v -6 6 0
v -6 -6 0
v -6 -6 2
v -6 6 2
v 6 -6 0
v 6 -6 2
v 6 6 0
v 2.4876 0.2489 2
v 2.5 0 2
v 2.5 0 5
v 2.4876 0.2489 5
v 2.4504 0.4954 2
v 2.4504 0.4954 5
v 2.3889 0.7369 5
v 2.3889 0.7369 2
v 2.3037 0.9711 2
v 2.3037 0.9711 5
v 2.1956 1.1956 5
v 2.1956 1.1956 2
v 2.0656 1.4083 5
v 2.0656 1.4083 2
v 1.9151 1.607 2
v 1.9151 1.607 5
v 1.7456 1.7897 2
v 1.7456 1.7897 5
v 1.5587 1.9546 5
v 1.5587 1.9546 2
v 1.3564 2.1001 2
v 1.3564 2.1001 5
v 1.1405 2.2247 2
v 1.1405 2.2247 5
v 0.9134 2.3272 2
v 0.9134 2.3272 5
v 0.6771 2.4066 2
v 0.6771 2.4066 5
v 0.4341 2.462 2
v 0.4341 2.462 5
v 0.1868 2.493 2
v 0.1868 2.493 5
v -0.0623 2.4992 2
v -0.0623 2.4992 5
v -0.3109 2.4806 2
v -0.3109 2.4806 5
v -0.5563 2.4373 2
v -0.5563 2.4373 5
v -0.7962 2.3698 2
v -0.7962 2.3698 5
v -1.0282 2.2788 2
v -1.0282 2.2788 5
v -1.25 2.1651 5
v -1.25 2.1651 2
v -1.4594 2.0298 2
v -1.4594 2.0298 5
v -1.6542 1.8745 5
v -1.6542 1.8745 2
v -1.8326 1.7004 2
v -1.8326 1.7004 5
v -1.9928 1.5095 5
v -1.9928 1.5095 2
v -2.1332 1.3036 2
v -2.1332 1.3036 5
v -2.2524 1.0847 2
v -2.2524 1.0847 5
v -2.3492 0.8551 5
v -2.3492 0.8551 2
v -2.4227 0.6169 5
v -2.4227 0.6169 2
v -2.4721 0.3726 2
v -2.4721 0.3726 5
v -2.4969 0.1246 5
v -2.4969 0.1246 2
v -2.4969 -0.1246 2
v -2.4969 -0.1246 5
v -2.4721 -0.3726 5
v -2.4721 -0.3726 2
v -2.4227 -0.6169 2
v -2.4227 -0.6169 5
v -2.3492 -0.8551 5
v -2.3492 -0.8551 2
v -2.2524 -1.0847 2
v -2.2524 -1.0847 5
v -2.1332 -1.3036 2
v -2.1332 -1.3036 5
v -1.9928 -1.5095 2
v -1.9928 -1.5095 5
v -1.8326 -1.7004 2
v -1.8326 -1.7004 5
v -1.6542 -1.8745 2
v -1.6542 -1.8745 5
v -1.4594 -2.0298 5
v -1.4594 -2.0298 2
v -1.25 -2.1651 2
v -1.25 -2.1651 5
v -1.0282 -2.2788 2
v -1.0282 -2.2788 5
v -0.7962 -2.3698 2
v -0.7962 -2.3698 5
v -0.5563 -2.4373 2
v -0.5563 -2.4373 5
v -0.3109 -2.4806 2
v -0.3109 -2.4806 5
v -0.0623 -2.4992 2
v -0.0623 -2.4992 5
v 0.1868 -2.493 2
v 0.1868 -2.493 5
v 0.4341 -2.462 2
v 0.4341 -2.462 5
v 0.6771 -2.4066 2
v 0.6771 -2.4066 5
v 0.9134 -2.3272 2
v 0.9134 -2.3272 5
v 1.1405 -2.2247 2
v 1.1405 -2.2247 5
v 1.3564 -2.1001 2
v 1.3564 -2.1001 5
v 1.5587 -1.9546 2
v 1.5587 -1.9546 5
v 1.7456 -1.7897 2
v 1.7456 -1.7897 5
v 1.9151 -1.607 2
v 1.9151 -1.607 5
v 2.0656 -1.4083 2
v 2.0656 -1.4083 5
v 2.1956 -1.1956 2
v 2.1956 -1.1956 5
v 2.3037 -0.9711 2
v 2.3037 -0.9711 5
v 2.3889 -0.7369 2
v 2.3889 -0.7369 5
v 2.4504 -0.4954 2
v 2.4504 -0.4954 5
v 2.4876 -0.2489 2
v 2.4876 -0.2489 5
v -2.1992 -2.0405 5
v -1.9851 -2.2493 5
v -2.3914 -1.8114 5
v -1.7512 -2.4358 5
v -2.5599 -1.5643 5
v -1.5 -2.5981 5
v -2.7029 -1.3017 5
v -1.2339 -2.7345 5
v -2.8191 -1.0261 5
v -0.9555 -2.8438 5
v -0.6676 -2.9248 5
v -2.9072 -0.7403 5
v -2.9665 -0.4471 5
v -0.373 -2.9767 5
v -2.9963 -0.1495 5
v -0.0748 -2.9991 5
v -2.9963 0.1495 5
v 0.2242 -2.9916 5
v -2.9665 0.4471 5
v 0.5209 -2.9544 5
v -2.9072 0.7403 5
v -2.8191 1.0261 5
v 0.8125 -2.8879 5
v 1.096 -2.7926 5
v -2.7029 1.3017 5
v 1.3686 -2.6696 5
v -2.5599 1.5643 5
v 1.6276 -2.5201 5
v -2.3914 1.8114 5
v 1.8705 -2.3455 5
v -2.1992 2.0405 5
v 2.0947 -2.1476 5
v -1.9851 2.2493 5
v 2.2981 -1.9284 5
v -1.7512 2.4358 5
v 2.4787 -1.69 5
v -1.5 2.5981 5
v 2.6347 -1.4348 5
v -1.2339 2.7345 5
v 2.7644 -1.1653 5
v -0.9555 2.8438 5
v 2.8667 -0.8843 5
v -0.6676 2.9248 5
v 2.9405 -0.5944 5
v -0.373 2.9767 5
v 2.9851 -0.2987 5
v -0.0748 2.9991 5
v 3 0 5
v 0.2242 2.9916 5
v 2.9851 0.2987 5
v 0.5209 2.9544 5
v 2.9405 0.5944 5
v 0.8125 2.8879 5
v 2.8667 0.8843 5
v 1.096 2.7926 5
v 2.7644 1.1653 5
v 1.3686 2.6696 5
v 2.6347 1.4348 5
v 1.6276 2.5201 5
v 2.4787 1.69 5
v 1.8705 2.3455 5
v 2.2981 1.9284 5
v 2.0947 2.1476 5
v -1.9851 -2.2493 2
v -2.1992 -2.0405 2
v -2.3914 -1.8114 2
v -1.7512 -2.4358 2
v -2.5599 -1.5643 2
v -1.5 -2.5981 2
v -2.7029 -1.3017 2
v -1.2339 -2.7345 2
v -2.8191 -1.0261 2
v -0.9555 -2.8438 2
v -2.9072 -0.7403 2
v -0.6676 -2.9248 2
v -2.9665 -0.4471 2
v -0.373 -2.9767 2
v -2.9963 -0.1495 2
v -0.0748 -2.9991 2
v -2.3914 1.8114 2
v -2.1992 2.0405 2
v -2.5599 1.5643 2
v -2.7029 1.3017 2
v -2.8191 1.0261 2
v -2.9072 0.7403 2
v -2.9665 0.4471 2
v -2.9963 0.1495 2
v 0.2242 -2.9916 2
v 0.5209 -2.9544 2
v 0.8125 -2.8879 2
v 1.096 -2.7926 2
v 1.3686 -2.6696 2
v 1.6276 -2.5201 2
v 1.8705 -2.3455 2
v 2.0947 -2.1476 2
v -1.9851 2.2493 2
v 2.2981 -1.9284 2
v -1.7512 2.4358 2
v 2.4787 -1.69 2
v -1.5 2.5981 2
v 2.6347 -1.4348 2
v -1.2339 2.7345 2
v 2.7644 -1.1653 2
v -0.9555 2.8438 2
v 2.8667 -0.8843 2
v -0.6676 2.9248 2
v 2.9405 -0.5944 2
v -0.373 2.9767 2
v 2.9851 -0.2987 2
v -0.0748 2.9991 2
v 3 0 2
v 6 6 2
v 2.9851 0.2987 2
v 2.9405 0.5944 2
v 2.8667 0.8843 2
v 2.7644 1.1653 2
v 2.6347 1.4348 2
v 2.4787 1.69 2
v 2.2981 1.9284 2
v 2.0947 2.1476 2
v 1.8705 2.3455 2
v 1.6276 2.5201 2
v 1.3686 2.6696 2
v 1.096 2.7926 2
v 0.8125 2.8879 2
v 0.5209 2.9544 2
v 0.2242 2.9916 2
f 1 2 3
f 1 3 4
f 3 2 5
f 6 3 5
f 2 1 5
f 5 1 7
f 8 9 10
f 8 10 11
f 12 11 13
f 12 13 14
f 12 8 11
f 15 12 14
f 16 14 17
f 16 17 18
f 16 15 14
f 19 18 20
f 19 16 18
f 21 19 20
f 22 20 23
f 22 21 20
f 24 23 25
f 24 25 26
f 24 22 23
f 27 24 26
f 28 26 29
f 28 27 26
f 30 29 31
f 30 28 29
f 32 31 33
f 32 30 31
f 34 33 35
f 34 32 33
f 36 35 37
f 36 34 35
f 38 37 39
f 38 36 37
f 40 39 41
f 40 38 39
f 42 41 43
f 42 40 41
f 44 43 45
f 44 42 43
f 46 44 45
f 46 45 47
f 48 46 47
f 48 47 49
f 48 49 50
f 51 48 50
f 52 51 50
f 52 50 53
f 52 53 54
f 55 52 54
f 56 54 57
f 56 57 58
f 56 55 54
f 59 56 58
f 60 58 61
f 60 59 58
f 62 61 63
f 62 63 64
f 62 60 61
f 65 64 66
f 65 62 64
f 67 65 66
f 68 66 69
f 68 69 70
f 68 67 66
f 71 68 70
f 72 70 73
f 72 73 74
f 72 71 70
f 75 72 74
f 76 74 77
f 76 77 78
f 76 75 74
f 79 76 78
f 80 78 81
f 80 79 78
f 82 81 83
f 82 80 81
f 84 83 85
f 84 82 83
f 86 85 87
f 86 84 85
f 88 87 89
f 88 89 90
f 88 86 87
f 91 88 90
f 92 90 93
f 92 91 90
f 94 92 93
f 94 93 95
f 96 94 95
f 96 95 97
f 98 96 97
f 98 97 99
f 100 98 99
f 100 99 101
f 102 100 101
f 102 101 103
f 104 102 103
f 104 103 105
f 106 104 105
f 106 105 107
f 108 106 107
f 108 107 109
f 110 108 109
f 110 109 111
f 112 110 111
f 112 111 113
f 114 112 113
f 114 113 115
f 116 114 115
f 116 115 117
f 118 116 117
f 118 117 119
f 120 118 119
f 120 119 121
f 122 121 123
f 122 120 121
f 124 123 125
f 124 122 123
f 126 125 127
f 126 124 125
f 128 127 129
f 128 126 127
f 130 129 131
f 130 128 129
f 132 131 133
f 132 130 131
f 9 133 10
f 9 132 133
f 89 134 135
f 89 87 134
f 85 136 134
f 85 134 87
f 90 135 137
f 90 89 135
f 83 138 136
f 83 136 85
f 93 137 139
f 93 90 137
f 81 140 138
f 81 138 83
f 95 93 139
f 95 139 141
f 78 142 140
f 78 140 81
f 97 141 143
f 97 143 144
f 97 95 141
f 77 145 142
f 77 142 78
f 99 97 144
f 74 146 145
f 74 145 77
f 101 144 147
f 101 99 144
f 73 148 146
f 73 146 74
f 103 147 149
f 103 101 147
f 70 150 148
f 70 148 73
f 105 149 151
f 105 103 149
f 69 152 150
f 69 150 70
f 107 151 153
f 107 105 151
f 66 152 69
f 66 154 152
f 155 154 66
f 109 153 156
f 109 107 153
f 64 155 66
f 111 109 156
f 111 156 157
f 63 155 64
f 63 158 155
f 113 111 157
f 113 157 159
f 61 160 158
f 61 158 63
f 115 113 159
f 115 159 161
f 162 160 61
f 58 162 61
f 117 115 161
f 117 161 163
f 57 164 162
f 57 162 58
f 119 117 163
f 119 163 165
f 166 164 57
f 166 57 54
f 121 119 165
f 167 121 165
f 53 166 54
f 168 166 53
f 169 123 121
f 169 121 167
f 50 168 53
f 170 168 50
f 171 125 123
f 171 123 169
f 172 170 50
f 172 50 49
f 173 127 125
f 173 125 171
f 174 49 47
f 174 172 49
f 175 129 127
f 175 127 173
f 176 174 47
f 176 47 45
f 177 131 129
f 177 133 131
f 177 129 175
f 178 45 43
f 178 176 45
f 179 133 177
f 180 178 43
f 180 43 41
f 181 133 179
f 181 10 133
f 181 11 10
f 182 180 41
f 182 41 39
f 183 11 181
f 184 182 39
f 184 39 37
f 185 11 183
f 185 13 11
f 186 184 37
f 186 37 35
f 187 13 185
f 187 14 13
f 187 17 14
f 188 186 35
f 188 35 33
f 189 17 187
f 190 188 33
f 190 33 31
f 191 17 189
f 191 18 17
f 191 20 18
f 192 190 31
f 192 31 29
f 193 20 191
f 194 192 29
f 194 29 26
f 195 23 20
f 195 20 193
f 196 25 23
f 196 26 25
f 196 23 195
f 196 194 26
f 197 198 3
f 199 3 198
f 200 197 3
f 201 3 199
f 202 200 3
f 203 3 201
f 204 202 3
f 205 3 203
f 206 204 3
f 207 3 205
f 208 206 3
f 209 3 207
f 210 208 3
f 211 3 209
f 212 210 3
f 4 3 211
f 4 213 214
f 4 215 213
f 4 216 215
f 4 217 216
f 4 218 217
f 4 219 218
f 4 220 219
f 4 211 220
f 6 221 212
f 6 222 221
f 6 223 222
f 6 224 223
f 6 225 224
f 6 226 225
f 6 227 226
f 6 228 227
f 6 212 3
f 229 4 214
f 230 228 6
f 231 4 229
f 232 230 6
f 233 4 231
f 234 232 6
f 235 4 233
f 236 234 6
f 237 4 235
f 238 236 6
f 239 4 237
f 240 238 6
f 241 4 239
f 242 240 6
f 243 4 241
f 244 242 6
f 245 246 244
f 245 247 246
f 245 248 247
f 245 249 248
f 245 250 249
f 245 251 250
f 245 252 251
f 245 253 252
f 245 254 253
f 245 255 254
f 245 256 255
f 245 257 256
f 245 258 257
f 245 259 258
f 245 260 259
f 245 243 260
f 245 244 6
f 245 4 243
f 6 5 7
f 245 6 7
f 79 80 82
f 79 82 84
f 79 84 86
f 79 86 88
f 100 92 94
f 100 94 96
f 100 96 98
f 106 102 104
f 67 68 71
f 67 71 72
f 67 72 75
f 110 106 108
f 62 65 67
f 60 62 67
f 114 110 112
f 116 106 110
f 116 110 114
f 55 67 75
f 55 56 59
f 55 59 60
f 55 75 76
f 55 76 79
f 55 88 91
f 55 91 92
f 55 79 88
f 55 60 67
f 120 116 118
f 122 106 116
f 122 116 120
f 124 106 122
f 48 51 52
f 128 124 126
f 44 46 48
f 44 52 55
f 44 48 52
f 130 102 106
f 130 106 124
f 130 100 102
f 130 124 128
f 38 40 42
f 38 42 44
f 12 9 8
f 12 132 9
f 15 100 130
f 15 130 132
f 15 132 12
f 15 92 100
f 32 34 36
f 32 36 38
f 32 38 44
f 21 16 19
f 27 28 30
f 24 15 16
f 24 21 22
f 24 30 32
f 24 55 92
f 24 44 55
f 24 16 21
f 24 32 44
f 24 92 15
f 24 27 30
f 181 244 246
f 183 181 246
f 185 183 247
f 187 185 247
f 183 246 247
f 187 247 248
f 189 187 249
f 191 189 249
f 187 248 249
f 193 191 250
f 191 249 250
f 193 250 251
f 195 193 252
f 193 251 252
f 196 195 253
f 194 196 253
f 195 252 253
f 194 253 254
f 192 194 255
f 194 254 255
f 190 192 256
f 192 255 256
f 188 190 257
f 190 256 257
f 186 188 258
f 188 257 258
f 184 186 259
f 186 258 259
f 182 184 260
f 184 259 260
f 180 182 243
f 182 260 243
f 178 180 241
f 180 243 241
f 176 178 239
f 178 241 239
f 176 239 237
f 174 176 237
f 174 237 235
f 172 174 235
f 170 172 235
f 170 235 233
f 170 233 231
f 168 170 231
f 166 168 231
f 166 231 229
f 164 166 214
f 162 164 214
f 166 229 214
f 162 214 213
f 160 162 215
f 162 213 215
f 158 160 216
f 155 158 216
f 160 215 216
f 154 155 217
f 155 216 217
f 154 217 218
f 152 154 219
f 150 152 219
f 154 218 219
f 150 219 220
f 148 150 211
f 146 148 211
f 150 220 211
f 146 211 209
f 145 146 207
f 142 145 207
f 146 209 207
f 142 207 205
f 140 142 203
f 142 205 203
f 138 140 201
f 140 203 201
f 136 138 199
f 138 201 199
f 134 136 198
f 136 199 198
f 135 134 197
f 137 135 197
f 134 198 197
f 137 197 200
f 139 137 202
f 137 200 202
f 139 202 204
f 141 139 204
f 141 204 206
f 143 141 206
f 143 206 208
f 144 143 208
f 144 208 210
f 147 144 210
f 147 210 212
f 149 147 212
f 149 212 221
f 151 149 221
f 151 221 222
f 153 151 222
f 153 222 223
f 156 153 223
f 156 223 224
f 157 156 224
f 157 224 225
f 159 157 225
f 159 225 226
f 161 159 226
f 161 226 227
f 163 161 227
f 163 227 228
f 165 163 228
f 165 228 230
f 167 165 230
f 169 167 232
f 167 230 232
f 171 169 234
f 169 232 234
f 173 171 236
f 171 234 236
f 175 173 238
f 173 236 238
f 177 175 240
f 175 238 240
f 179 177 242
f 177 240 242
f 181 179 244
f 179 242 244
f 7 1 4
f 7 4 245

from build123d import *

# Parameters (mm, degrees)
SKETCH1_W           = 12
SKETCH1_H           = 12
BOSS_EXTRUDE1_DEPTH = 2
SKETCH2_R           = 3
SKETCH2_R_2         = 2.5
BOSS_EXTRUDE2_DEPTH = 3


with BuildPart() as part:
    # Sketch1 → Boss-Extrude1 (new body)
    with BuildSketch(Plane.XY):
        Rectangle(SKETCH1_W, SKETCH1_H)
    extrude(amount=BOSS_EXTRUDE1_DEPTH)

    # Sketch2 → Boss-Extrude2 (add)
    with BuildSketch(Plane.XY.offset(2)):
        Circle(SKETCH2_R)
        Circle(SKETCH2_R_2, mode=Mode.SUBTRACT)
    extrude(amount=BOSS_EXTRUDE2_DEPTH)


solid = part.part
